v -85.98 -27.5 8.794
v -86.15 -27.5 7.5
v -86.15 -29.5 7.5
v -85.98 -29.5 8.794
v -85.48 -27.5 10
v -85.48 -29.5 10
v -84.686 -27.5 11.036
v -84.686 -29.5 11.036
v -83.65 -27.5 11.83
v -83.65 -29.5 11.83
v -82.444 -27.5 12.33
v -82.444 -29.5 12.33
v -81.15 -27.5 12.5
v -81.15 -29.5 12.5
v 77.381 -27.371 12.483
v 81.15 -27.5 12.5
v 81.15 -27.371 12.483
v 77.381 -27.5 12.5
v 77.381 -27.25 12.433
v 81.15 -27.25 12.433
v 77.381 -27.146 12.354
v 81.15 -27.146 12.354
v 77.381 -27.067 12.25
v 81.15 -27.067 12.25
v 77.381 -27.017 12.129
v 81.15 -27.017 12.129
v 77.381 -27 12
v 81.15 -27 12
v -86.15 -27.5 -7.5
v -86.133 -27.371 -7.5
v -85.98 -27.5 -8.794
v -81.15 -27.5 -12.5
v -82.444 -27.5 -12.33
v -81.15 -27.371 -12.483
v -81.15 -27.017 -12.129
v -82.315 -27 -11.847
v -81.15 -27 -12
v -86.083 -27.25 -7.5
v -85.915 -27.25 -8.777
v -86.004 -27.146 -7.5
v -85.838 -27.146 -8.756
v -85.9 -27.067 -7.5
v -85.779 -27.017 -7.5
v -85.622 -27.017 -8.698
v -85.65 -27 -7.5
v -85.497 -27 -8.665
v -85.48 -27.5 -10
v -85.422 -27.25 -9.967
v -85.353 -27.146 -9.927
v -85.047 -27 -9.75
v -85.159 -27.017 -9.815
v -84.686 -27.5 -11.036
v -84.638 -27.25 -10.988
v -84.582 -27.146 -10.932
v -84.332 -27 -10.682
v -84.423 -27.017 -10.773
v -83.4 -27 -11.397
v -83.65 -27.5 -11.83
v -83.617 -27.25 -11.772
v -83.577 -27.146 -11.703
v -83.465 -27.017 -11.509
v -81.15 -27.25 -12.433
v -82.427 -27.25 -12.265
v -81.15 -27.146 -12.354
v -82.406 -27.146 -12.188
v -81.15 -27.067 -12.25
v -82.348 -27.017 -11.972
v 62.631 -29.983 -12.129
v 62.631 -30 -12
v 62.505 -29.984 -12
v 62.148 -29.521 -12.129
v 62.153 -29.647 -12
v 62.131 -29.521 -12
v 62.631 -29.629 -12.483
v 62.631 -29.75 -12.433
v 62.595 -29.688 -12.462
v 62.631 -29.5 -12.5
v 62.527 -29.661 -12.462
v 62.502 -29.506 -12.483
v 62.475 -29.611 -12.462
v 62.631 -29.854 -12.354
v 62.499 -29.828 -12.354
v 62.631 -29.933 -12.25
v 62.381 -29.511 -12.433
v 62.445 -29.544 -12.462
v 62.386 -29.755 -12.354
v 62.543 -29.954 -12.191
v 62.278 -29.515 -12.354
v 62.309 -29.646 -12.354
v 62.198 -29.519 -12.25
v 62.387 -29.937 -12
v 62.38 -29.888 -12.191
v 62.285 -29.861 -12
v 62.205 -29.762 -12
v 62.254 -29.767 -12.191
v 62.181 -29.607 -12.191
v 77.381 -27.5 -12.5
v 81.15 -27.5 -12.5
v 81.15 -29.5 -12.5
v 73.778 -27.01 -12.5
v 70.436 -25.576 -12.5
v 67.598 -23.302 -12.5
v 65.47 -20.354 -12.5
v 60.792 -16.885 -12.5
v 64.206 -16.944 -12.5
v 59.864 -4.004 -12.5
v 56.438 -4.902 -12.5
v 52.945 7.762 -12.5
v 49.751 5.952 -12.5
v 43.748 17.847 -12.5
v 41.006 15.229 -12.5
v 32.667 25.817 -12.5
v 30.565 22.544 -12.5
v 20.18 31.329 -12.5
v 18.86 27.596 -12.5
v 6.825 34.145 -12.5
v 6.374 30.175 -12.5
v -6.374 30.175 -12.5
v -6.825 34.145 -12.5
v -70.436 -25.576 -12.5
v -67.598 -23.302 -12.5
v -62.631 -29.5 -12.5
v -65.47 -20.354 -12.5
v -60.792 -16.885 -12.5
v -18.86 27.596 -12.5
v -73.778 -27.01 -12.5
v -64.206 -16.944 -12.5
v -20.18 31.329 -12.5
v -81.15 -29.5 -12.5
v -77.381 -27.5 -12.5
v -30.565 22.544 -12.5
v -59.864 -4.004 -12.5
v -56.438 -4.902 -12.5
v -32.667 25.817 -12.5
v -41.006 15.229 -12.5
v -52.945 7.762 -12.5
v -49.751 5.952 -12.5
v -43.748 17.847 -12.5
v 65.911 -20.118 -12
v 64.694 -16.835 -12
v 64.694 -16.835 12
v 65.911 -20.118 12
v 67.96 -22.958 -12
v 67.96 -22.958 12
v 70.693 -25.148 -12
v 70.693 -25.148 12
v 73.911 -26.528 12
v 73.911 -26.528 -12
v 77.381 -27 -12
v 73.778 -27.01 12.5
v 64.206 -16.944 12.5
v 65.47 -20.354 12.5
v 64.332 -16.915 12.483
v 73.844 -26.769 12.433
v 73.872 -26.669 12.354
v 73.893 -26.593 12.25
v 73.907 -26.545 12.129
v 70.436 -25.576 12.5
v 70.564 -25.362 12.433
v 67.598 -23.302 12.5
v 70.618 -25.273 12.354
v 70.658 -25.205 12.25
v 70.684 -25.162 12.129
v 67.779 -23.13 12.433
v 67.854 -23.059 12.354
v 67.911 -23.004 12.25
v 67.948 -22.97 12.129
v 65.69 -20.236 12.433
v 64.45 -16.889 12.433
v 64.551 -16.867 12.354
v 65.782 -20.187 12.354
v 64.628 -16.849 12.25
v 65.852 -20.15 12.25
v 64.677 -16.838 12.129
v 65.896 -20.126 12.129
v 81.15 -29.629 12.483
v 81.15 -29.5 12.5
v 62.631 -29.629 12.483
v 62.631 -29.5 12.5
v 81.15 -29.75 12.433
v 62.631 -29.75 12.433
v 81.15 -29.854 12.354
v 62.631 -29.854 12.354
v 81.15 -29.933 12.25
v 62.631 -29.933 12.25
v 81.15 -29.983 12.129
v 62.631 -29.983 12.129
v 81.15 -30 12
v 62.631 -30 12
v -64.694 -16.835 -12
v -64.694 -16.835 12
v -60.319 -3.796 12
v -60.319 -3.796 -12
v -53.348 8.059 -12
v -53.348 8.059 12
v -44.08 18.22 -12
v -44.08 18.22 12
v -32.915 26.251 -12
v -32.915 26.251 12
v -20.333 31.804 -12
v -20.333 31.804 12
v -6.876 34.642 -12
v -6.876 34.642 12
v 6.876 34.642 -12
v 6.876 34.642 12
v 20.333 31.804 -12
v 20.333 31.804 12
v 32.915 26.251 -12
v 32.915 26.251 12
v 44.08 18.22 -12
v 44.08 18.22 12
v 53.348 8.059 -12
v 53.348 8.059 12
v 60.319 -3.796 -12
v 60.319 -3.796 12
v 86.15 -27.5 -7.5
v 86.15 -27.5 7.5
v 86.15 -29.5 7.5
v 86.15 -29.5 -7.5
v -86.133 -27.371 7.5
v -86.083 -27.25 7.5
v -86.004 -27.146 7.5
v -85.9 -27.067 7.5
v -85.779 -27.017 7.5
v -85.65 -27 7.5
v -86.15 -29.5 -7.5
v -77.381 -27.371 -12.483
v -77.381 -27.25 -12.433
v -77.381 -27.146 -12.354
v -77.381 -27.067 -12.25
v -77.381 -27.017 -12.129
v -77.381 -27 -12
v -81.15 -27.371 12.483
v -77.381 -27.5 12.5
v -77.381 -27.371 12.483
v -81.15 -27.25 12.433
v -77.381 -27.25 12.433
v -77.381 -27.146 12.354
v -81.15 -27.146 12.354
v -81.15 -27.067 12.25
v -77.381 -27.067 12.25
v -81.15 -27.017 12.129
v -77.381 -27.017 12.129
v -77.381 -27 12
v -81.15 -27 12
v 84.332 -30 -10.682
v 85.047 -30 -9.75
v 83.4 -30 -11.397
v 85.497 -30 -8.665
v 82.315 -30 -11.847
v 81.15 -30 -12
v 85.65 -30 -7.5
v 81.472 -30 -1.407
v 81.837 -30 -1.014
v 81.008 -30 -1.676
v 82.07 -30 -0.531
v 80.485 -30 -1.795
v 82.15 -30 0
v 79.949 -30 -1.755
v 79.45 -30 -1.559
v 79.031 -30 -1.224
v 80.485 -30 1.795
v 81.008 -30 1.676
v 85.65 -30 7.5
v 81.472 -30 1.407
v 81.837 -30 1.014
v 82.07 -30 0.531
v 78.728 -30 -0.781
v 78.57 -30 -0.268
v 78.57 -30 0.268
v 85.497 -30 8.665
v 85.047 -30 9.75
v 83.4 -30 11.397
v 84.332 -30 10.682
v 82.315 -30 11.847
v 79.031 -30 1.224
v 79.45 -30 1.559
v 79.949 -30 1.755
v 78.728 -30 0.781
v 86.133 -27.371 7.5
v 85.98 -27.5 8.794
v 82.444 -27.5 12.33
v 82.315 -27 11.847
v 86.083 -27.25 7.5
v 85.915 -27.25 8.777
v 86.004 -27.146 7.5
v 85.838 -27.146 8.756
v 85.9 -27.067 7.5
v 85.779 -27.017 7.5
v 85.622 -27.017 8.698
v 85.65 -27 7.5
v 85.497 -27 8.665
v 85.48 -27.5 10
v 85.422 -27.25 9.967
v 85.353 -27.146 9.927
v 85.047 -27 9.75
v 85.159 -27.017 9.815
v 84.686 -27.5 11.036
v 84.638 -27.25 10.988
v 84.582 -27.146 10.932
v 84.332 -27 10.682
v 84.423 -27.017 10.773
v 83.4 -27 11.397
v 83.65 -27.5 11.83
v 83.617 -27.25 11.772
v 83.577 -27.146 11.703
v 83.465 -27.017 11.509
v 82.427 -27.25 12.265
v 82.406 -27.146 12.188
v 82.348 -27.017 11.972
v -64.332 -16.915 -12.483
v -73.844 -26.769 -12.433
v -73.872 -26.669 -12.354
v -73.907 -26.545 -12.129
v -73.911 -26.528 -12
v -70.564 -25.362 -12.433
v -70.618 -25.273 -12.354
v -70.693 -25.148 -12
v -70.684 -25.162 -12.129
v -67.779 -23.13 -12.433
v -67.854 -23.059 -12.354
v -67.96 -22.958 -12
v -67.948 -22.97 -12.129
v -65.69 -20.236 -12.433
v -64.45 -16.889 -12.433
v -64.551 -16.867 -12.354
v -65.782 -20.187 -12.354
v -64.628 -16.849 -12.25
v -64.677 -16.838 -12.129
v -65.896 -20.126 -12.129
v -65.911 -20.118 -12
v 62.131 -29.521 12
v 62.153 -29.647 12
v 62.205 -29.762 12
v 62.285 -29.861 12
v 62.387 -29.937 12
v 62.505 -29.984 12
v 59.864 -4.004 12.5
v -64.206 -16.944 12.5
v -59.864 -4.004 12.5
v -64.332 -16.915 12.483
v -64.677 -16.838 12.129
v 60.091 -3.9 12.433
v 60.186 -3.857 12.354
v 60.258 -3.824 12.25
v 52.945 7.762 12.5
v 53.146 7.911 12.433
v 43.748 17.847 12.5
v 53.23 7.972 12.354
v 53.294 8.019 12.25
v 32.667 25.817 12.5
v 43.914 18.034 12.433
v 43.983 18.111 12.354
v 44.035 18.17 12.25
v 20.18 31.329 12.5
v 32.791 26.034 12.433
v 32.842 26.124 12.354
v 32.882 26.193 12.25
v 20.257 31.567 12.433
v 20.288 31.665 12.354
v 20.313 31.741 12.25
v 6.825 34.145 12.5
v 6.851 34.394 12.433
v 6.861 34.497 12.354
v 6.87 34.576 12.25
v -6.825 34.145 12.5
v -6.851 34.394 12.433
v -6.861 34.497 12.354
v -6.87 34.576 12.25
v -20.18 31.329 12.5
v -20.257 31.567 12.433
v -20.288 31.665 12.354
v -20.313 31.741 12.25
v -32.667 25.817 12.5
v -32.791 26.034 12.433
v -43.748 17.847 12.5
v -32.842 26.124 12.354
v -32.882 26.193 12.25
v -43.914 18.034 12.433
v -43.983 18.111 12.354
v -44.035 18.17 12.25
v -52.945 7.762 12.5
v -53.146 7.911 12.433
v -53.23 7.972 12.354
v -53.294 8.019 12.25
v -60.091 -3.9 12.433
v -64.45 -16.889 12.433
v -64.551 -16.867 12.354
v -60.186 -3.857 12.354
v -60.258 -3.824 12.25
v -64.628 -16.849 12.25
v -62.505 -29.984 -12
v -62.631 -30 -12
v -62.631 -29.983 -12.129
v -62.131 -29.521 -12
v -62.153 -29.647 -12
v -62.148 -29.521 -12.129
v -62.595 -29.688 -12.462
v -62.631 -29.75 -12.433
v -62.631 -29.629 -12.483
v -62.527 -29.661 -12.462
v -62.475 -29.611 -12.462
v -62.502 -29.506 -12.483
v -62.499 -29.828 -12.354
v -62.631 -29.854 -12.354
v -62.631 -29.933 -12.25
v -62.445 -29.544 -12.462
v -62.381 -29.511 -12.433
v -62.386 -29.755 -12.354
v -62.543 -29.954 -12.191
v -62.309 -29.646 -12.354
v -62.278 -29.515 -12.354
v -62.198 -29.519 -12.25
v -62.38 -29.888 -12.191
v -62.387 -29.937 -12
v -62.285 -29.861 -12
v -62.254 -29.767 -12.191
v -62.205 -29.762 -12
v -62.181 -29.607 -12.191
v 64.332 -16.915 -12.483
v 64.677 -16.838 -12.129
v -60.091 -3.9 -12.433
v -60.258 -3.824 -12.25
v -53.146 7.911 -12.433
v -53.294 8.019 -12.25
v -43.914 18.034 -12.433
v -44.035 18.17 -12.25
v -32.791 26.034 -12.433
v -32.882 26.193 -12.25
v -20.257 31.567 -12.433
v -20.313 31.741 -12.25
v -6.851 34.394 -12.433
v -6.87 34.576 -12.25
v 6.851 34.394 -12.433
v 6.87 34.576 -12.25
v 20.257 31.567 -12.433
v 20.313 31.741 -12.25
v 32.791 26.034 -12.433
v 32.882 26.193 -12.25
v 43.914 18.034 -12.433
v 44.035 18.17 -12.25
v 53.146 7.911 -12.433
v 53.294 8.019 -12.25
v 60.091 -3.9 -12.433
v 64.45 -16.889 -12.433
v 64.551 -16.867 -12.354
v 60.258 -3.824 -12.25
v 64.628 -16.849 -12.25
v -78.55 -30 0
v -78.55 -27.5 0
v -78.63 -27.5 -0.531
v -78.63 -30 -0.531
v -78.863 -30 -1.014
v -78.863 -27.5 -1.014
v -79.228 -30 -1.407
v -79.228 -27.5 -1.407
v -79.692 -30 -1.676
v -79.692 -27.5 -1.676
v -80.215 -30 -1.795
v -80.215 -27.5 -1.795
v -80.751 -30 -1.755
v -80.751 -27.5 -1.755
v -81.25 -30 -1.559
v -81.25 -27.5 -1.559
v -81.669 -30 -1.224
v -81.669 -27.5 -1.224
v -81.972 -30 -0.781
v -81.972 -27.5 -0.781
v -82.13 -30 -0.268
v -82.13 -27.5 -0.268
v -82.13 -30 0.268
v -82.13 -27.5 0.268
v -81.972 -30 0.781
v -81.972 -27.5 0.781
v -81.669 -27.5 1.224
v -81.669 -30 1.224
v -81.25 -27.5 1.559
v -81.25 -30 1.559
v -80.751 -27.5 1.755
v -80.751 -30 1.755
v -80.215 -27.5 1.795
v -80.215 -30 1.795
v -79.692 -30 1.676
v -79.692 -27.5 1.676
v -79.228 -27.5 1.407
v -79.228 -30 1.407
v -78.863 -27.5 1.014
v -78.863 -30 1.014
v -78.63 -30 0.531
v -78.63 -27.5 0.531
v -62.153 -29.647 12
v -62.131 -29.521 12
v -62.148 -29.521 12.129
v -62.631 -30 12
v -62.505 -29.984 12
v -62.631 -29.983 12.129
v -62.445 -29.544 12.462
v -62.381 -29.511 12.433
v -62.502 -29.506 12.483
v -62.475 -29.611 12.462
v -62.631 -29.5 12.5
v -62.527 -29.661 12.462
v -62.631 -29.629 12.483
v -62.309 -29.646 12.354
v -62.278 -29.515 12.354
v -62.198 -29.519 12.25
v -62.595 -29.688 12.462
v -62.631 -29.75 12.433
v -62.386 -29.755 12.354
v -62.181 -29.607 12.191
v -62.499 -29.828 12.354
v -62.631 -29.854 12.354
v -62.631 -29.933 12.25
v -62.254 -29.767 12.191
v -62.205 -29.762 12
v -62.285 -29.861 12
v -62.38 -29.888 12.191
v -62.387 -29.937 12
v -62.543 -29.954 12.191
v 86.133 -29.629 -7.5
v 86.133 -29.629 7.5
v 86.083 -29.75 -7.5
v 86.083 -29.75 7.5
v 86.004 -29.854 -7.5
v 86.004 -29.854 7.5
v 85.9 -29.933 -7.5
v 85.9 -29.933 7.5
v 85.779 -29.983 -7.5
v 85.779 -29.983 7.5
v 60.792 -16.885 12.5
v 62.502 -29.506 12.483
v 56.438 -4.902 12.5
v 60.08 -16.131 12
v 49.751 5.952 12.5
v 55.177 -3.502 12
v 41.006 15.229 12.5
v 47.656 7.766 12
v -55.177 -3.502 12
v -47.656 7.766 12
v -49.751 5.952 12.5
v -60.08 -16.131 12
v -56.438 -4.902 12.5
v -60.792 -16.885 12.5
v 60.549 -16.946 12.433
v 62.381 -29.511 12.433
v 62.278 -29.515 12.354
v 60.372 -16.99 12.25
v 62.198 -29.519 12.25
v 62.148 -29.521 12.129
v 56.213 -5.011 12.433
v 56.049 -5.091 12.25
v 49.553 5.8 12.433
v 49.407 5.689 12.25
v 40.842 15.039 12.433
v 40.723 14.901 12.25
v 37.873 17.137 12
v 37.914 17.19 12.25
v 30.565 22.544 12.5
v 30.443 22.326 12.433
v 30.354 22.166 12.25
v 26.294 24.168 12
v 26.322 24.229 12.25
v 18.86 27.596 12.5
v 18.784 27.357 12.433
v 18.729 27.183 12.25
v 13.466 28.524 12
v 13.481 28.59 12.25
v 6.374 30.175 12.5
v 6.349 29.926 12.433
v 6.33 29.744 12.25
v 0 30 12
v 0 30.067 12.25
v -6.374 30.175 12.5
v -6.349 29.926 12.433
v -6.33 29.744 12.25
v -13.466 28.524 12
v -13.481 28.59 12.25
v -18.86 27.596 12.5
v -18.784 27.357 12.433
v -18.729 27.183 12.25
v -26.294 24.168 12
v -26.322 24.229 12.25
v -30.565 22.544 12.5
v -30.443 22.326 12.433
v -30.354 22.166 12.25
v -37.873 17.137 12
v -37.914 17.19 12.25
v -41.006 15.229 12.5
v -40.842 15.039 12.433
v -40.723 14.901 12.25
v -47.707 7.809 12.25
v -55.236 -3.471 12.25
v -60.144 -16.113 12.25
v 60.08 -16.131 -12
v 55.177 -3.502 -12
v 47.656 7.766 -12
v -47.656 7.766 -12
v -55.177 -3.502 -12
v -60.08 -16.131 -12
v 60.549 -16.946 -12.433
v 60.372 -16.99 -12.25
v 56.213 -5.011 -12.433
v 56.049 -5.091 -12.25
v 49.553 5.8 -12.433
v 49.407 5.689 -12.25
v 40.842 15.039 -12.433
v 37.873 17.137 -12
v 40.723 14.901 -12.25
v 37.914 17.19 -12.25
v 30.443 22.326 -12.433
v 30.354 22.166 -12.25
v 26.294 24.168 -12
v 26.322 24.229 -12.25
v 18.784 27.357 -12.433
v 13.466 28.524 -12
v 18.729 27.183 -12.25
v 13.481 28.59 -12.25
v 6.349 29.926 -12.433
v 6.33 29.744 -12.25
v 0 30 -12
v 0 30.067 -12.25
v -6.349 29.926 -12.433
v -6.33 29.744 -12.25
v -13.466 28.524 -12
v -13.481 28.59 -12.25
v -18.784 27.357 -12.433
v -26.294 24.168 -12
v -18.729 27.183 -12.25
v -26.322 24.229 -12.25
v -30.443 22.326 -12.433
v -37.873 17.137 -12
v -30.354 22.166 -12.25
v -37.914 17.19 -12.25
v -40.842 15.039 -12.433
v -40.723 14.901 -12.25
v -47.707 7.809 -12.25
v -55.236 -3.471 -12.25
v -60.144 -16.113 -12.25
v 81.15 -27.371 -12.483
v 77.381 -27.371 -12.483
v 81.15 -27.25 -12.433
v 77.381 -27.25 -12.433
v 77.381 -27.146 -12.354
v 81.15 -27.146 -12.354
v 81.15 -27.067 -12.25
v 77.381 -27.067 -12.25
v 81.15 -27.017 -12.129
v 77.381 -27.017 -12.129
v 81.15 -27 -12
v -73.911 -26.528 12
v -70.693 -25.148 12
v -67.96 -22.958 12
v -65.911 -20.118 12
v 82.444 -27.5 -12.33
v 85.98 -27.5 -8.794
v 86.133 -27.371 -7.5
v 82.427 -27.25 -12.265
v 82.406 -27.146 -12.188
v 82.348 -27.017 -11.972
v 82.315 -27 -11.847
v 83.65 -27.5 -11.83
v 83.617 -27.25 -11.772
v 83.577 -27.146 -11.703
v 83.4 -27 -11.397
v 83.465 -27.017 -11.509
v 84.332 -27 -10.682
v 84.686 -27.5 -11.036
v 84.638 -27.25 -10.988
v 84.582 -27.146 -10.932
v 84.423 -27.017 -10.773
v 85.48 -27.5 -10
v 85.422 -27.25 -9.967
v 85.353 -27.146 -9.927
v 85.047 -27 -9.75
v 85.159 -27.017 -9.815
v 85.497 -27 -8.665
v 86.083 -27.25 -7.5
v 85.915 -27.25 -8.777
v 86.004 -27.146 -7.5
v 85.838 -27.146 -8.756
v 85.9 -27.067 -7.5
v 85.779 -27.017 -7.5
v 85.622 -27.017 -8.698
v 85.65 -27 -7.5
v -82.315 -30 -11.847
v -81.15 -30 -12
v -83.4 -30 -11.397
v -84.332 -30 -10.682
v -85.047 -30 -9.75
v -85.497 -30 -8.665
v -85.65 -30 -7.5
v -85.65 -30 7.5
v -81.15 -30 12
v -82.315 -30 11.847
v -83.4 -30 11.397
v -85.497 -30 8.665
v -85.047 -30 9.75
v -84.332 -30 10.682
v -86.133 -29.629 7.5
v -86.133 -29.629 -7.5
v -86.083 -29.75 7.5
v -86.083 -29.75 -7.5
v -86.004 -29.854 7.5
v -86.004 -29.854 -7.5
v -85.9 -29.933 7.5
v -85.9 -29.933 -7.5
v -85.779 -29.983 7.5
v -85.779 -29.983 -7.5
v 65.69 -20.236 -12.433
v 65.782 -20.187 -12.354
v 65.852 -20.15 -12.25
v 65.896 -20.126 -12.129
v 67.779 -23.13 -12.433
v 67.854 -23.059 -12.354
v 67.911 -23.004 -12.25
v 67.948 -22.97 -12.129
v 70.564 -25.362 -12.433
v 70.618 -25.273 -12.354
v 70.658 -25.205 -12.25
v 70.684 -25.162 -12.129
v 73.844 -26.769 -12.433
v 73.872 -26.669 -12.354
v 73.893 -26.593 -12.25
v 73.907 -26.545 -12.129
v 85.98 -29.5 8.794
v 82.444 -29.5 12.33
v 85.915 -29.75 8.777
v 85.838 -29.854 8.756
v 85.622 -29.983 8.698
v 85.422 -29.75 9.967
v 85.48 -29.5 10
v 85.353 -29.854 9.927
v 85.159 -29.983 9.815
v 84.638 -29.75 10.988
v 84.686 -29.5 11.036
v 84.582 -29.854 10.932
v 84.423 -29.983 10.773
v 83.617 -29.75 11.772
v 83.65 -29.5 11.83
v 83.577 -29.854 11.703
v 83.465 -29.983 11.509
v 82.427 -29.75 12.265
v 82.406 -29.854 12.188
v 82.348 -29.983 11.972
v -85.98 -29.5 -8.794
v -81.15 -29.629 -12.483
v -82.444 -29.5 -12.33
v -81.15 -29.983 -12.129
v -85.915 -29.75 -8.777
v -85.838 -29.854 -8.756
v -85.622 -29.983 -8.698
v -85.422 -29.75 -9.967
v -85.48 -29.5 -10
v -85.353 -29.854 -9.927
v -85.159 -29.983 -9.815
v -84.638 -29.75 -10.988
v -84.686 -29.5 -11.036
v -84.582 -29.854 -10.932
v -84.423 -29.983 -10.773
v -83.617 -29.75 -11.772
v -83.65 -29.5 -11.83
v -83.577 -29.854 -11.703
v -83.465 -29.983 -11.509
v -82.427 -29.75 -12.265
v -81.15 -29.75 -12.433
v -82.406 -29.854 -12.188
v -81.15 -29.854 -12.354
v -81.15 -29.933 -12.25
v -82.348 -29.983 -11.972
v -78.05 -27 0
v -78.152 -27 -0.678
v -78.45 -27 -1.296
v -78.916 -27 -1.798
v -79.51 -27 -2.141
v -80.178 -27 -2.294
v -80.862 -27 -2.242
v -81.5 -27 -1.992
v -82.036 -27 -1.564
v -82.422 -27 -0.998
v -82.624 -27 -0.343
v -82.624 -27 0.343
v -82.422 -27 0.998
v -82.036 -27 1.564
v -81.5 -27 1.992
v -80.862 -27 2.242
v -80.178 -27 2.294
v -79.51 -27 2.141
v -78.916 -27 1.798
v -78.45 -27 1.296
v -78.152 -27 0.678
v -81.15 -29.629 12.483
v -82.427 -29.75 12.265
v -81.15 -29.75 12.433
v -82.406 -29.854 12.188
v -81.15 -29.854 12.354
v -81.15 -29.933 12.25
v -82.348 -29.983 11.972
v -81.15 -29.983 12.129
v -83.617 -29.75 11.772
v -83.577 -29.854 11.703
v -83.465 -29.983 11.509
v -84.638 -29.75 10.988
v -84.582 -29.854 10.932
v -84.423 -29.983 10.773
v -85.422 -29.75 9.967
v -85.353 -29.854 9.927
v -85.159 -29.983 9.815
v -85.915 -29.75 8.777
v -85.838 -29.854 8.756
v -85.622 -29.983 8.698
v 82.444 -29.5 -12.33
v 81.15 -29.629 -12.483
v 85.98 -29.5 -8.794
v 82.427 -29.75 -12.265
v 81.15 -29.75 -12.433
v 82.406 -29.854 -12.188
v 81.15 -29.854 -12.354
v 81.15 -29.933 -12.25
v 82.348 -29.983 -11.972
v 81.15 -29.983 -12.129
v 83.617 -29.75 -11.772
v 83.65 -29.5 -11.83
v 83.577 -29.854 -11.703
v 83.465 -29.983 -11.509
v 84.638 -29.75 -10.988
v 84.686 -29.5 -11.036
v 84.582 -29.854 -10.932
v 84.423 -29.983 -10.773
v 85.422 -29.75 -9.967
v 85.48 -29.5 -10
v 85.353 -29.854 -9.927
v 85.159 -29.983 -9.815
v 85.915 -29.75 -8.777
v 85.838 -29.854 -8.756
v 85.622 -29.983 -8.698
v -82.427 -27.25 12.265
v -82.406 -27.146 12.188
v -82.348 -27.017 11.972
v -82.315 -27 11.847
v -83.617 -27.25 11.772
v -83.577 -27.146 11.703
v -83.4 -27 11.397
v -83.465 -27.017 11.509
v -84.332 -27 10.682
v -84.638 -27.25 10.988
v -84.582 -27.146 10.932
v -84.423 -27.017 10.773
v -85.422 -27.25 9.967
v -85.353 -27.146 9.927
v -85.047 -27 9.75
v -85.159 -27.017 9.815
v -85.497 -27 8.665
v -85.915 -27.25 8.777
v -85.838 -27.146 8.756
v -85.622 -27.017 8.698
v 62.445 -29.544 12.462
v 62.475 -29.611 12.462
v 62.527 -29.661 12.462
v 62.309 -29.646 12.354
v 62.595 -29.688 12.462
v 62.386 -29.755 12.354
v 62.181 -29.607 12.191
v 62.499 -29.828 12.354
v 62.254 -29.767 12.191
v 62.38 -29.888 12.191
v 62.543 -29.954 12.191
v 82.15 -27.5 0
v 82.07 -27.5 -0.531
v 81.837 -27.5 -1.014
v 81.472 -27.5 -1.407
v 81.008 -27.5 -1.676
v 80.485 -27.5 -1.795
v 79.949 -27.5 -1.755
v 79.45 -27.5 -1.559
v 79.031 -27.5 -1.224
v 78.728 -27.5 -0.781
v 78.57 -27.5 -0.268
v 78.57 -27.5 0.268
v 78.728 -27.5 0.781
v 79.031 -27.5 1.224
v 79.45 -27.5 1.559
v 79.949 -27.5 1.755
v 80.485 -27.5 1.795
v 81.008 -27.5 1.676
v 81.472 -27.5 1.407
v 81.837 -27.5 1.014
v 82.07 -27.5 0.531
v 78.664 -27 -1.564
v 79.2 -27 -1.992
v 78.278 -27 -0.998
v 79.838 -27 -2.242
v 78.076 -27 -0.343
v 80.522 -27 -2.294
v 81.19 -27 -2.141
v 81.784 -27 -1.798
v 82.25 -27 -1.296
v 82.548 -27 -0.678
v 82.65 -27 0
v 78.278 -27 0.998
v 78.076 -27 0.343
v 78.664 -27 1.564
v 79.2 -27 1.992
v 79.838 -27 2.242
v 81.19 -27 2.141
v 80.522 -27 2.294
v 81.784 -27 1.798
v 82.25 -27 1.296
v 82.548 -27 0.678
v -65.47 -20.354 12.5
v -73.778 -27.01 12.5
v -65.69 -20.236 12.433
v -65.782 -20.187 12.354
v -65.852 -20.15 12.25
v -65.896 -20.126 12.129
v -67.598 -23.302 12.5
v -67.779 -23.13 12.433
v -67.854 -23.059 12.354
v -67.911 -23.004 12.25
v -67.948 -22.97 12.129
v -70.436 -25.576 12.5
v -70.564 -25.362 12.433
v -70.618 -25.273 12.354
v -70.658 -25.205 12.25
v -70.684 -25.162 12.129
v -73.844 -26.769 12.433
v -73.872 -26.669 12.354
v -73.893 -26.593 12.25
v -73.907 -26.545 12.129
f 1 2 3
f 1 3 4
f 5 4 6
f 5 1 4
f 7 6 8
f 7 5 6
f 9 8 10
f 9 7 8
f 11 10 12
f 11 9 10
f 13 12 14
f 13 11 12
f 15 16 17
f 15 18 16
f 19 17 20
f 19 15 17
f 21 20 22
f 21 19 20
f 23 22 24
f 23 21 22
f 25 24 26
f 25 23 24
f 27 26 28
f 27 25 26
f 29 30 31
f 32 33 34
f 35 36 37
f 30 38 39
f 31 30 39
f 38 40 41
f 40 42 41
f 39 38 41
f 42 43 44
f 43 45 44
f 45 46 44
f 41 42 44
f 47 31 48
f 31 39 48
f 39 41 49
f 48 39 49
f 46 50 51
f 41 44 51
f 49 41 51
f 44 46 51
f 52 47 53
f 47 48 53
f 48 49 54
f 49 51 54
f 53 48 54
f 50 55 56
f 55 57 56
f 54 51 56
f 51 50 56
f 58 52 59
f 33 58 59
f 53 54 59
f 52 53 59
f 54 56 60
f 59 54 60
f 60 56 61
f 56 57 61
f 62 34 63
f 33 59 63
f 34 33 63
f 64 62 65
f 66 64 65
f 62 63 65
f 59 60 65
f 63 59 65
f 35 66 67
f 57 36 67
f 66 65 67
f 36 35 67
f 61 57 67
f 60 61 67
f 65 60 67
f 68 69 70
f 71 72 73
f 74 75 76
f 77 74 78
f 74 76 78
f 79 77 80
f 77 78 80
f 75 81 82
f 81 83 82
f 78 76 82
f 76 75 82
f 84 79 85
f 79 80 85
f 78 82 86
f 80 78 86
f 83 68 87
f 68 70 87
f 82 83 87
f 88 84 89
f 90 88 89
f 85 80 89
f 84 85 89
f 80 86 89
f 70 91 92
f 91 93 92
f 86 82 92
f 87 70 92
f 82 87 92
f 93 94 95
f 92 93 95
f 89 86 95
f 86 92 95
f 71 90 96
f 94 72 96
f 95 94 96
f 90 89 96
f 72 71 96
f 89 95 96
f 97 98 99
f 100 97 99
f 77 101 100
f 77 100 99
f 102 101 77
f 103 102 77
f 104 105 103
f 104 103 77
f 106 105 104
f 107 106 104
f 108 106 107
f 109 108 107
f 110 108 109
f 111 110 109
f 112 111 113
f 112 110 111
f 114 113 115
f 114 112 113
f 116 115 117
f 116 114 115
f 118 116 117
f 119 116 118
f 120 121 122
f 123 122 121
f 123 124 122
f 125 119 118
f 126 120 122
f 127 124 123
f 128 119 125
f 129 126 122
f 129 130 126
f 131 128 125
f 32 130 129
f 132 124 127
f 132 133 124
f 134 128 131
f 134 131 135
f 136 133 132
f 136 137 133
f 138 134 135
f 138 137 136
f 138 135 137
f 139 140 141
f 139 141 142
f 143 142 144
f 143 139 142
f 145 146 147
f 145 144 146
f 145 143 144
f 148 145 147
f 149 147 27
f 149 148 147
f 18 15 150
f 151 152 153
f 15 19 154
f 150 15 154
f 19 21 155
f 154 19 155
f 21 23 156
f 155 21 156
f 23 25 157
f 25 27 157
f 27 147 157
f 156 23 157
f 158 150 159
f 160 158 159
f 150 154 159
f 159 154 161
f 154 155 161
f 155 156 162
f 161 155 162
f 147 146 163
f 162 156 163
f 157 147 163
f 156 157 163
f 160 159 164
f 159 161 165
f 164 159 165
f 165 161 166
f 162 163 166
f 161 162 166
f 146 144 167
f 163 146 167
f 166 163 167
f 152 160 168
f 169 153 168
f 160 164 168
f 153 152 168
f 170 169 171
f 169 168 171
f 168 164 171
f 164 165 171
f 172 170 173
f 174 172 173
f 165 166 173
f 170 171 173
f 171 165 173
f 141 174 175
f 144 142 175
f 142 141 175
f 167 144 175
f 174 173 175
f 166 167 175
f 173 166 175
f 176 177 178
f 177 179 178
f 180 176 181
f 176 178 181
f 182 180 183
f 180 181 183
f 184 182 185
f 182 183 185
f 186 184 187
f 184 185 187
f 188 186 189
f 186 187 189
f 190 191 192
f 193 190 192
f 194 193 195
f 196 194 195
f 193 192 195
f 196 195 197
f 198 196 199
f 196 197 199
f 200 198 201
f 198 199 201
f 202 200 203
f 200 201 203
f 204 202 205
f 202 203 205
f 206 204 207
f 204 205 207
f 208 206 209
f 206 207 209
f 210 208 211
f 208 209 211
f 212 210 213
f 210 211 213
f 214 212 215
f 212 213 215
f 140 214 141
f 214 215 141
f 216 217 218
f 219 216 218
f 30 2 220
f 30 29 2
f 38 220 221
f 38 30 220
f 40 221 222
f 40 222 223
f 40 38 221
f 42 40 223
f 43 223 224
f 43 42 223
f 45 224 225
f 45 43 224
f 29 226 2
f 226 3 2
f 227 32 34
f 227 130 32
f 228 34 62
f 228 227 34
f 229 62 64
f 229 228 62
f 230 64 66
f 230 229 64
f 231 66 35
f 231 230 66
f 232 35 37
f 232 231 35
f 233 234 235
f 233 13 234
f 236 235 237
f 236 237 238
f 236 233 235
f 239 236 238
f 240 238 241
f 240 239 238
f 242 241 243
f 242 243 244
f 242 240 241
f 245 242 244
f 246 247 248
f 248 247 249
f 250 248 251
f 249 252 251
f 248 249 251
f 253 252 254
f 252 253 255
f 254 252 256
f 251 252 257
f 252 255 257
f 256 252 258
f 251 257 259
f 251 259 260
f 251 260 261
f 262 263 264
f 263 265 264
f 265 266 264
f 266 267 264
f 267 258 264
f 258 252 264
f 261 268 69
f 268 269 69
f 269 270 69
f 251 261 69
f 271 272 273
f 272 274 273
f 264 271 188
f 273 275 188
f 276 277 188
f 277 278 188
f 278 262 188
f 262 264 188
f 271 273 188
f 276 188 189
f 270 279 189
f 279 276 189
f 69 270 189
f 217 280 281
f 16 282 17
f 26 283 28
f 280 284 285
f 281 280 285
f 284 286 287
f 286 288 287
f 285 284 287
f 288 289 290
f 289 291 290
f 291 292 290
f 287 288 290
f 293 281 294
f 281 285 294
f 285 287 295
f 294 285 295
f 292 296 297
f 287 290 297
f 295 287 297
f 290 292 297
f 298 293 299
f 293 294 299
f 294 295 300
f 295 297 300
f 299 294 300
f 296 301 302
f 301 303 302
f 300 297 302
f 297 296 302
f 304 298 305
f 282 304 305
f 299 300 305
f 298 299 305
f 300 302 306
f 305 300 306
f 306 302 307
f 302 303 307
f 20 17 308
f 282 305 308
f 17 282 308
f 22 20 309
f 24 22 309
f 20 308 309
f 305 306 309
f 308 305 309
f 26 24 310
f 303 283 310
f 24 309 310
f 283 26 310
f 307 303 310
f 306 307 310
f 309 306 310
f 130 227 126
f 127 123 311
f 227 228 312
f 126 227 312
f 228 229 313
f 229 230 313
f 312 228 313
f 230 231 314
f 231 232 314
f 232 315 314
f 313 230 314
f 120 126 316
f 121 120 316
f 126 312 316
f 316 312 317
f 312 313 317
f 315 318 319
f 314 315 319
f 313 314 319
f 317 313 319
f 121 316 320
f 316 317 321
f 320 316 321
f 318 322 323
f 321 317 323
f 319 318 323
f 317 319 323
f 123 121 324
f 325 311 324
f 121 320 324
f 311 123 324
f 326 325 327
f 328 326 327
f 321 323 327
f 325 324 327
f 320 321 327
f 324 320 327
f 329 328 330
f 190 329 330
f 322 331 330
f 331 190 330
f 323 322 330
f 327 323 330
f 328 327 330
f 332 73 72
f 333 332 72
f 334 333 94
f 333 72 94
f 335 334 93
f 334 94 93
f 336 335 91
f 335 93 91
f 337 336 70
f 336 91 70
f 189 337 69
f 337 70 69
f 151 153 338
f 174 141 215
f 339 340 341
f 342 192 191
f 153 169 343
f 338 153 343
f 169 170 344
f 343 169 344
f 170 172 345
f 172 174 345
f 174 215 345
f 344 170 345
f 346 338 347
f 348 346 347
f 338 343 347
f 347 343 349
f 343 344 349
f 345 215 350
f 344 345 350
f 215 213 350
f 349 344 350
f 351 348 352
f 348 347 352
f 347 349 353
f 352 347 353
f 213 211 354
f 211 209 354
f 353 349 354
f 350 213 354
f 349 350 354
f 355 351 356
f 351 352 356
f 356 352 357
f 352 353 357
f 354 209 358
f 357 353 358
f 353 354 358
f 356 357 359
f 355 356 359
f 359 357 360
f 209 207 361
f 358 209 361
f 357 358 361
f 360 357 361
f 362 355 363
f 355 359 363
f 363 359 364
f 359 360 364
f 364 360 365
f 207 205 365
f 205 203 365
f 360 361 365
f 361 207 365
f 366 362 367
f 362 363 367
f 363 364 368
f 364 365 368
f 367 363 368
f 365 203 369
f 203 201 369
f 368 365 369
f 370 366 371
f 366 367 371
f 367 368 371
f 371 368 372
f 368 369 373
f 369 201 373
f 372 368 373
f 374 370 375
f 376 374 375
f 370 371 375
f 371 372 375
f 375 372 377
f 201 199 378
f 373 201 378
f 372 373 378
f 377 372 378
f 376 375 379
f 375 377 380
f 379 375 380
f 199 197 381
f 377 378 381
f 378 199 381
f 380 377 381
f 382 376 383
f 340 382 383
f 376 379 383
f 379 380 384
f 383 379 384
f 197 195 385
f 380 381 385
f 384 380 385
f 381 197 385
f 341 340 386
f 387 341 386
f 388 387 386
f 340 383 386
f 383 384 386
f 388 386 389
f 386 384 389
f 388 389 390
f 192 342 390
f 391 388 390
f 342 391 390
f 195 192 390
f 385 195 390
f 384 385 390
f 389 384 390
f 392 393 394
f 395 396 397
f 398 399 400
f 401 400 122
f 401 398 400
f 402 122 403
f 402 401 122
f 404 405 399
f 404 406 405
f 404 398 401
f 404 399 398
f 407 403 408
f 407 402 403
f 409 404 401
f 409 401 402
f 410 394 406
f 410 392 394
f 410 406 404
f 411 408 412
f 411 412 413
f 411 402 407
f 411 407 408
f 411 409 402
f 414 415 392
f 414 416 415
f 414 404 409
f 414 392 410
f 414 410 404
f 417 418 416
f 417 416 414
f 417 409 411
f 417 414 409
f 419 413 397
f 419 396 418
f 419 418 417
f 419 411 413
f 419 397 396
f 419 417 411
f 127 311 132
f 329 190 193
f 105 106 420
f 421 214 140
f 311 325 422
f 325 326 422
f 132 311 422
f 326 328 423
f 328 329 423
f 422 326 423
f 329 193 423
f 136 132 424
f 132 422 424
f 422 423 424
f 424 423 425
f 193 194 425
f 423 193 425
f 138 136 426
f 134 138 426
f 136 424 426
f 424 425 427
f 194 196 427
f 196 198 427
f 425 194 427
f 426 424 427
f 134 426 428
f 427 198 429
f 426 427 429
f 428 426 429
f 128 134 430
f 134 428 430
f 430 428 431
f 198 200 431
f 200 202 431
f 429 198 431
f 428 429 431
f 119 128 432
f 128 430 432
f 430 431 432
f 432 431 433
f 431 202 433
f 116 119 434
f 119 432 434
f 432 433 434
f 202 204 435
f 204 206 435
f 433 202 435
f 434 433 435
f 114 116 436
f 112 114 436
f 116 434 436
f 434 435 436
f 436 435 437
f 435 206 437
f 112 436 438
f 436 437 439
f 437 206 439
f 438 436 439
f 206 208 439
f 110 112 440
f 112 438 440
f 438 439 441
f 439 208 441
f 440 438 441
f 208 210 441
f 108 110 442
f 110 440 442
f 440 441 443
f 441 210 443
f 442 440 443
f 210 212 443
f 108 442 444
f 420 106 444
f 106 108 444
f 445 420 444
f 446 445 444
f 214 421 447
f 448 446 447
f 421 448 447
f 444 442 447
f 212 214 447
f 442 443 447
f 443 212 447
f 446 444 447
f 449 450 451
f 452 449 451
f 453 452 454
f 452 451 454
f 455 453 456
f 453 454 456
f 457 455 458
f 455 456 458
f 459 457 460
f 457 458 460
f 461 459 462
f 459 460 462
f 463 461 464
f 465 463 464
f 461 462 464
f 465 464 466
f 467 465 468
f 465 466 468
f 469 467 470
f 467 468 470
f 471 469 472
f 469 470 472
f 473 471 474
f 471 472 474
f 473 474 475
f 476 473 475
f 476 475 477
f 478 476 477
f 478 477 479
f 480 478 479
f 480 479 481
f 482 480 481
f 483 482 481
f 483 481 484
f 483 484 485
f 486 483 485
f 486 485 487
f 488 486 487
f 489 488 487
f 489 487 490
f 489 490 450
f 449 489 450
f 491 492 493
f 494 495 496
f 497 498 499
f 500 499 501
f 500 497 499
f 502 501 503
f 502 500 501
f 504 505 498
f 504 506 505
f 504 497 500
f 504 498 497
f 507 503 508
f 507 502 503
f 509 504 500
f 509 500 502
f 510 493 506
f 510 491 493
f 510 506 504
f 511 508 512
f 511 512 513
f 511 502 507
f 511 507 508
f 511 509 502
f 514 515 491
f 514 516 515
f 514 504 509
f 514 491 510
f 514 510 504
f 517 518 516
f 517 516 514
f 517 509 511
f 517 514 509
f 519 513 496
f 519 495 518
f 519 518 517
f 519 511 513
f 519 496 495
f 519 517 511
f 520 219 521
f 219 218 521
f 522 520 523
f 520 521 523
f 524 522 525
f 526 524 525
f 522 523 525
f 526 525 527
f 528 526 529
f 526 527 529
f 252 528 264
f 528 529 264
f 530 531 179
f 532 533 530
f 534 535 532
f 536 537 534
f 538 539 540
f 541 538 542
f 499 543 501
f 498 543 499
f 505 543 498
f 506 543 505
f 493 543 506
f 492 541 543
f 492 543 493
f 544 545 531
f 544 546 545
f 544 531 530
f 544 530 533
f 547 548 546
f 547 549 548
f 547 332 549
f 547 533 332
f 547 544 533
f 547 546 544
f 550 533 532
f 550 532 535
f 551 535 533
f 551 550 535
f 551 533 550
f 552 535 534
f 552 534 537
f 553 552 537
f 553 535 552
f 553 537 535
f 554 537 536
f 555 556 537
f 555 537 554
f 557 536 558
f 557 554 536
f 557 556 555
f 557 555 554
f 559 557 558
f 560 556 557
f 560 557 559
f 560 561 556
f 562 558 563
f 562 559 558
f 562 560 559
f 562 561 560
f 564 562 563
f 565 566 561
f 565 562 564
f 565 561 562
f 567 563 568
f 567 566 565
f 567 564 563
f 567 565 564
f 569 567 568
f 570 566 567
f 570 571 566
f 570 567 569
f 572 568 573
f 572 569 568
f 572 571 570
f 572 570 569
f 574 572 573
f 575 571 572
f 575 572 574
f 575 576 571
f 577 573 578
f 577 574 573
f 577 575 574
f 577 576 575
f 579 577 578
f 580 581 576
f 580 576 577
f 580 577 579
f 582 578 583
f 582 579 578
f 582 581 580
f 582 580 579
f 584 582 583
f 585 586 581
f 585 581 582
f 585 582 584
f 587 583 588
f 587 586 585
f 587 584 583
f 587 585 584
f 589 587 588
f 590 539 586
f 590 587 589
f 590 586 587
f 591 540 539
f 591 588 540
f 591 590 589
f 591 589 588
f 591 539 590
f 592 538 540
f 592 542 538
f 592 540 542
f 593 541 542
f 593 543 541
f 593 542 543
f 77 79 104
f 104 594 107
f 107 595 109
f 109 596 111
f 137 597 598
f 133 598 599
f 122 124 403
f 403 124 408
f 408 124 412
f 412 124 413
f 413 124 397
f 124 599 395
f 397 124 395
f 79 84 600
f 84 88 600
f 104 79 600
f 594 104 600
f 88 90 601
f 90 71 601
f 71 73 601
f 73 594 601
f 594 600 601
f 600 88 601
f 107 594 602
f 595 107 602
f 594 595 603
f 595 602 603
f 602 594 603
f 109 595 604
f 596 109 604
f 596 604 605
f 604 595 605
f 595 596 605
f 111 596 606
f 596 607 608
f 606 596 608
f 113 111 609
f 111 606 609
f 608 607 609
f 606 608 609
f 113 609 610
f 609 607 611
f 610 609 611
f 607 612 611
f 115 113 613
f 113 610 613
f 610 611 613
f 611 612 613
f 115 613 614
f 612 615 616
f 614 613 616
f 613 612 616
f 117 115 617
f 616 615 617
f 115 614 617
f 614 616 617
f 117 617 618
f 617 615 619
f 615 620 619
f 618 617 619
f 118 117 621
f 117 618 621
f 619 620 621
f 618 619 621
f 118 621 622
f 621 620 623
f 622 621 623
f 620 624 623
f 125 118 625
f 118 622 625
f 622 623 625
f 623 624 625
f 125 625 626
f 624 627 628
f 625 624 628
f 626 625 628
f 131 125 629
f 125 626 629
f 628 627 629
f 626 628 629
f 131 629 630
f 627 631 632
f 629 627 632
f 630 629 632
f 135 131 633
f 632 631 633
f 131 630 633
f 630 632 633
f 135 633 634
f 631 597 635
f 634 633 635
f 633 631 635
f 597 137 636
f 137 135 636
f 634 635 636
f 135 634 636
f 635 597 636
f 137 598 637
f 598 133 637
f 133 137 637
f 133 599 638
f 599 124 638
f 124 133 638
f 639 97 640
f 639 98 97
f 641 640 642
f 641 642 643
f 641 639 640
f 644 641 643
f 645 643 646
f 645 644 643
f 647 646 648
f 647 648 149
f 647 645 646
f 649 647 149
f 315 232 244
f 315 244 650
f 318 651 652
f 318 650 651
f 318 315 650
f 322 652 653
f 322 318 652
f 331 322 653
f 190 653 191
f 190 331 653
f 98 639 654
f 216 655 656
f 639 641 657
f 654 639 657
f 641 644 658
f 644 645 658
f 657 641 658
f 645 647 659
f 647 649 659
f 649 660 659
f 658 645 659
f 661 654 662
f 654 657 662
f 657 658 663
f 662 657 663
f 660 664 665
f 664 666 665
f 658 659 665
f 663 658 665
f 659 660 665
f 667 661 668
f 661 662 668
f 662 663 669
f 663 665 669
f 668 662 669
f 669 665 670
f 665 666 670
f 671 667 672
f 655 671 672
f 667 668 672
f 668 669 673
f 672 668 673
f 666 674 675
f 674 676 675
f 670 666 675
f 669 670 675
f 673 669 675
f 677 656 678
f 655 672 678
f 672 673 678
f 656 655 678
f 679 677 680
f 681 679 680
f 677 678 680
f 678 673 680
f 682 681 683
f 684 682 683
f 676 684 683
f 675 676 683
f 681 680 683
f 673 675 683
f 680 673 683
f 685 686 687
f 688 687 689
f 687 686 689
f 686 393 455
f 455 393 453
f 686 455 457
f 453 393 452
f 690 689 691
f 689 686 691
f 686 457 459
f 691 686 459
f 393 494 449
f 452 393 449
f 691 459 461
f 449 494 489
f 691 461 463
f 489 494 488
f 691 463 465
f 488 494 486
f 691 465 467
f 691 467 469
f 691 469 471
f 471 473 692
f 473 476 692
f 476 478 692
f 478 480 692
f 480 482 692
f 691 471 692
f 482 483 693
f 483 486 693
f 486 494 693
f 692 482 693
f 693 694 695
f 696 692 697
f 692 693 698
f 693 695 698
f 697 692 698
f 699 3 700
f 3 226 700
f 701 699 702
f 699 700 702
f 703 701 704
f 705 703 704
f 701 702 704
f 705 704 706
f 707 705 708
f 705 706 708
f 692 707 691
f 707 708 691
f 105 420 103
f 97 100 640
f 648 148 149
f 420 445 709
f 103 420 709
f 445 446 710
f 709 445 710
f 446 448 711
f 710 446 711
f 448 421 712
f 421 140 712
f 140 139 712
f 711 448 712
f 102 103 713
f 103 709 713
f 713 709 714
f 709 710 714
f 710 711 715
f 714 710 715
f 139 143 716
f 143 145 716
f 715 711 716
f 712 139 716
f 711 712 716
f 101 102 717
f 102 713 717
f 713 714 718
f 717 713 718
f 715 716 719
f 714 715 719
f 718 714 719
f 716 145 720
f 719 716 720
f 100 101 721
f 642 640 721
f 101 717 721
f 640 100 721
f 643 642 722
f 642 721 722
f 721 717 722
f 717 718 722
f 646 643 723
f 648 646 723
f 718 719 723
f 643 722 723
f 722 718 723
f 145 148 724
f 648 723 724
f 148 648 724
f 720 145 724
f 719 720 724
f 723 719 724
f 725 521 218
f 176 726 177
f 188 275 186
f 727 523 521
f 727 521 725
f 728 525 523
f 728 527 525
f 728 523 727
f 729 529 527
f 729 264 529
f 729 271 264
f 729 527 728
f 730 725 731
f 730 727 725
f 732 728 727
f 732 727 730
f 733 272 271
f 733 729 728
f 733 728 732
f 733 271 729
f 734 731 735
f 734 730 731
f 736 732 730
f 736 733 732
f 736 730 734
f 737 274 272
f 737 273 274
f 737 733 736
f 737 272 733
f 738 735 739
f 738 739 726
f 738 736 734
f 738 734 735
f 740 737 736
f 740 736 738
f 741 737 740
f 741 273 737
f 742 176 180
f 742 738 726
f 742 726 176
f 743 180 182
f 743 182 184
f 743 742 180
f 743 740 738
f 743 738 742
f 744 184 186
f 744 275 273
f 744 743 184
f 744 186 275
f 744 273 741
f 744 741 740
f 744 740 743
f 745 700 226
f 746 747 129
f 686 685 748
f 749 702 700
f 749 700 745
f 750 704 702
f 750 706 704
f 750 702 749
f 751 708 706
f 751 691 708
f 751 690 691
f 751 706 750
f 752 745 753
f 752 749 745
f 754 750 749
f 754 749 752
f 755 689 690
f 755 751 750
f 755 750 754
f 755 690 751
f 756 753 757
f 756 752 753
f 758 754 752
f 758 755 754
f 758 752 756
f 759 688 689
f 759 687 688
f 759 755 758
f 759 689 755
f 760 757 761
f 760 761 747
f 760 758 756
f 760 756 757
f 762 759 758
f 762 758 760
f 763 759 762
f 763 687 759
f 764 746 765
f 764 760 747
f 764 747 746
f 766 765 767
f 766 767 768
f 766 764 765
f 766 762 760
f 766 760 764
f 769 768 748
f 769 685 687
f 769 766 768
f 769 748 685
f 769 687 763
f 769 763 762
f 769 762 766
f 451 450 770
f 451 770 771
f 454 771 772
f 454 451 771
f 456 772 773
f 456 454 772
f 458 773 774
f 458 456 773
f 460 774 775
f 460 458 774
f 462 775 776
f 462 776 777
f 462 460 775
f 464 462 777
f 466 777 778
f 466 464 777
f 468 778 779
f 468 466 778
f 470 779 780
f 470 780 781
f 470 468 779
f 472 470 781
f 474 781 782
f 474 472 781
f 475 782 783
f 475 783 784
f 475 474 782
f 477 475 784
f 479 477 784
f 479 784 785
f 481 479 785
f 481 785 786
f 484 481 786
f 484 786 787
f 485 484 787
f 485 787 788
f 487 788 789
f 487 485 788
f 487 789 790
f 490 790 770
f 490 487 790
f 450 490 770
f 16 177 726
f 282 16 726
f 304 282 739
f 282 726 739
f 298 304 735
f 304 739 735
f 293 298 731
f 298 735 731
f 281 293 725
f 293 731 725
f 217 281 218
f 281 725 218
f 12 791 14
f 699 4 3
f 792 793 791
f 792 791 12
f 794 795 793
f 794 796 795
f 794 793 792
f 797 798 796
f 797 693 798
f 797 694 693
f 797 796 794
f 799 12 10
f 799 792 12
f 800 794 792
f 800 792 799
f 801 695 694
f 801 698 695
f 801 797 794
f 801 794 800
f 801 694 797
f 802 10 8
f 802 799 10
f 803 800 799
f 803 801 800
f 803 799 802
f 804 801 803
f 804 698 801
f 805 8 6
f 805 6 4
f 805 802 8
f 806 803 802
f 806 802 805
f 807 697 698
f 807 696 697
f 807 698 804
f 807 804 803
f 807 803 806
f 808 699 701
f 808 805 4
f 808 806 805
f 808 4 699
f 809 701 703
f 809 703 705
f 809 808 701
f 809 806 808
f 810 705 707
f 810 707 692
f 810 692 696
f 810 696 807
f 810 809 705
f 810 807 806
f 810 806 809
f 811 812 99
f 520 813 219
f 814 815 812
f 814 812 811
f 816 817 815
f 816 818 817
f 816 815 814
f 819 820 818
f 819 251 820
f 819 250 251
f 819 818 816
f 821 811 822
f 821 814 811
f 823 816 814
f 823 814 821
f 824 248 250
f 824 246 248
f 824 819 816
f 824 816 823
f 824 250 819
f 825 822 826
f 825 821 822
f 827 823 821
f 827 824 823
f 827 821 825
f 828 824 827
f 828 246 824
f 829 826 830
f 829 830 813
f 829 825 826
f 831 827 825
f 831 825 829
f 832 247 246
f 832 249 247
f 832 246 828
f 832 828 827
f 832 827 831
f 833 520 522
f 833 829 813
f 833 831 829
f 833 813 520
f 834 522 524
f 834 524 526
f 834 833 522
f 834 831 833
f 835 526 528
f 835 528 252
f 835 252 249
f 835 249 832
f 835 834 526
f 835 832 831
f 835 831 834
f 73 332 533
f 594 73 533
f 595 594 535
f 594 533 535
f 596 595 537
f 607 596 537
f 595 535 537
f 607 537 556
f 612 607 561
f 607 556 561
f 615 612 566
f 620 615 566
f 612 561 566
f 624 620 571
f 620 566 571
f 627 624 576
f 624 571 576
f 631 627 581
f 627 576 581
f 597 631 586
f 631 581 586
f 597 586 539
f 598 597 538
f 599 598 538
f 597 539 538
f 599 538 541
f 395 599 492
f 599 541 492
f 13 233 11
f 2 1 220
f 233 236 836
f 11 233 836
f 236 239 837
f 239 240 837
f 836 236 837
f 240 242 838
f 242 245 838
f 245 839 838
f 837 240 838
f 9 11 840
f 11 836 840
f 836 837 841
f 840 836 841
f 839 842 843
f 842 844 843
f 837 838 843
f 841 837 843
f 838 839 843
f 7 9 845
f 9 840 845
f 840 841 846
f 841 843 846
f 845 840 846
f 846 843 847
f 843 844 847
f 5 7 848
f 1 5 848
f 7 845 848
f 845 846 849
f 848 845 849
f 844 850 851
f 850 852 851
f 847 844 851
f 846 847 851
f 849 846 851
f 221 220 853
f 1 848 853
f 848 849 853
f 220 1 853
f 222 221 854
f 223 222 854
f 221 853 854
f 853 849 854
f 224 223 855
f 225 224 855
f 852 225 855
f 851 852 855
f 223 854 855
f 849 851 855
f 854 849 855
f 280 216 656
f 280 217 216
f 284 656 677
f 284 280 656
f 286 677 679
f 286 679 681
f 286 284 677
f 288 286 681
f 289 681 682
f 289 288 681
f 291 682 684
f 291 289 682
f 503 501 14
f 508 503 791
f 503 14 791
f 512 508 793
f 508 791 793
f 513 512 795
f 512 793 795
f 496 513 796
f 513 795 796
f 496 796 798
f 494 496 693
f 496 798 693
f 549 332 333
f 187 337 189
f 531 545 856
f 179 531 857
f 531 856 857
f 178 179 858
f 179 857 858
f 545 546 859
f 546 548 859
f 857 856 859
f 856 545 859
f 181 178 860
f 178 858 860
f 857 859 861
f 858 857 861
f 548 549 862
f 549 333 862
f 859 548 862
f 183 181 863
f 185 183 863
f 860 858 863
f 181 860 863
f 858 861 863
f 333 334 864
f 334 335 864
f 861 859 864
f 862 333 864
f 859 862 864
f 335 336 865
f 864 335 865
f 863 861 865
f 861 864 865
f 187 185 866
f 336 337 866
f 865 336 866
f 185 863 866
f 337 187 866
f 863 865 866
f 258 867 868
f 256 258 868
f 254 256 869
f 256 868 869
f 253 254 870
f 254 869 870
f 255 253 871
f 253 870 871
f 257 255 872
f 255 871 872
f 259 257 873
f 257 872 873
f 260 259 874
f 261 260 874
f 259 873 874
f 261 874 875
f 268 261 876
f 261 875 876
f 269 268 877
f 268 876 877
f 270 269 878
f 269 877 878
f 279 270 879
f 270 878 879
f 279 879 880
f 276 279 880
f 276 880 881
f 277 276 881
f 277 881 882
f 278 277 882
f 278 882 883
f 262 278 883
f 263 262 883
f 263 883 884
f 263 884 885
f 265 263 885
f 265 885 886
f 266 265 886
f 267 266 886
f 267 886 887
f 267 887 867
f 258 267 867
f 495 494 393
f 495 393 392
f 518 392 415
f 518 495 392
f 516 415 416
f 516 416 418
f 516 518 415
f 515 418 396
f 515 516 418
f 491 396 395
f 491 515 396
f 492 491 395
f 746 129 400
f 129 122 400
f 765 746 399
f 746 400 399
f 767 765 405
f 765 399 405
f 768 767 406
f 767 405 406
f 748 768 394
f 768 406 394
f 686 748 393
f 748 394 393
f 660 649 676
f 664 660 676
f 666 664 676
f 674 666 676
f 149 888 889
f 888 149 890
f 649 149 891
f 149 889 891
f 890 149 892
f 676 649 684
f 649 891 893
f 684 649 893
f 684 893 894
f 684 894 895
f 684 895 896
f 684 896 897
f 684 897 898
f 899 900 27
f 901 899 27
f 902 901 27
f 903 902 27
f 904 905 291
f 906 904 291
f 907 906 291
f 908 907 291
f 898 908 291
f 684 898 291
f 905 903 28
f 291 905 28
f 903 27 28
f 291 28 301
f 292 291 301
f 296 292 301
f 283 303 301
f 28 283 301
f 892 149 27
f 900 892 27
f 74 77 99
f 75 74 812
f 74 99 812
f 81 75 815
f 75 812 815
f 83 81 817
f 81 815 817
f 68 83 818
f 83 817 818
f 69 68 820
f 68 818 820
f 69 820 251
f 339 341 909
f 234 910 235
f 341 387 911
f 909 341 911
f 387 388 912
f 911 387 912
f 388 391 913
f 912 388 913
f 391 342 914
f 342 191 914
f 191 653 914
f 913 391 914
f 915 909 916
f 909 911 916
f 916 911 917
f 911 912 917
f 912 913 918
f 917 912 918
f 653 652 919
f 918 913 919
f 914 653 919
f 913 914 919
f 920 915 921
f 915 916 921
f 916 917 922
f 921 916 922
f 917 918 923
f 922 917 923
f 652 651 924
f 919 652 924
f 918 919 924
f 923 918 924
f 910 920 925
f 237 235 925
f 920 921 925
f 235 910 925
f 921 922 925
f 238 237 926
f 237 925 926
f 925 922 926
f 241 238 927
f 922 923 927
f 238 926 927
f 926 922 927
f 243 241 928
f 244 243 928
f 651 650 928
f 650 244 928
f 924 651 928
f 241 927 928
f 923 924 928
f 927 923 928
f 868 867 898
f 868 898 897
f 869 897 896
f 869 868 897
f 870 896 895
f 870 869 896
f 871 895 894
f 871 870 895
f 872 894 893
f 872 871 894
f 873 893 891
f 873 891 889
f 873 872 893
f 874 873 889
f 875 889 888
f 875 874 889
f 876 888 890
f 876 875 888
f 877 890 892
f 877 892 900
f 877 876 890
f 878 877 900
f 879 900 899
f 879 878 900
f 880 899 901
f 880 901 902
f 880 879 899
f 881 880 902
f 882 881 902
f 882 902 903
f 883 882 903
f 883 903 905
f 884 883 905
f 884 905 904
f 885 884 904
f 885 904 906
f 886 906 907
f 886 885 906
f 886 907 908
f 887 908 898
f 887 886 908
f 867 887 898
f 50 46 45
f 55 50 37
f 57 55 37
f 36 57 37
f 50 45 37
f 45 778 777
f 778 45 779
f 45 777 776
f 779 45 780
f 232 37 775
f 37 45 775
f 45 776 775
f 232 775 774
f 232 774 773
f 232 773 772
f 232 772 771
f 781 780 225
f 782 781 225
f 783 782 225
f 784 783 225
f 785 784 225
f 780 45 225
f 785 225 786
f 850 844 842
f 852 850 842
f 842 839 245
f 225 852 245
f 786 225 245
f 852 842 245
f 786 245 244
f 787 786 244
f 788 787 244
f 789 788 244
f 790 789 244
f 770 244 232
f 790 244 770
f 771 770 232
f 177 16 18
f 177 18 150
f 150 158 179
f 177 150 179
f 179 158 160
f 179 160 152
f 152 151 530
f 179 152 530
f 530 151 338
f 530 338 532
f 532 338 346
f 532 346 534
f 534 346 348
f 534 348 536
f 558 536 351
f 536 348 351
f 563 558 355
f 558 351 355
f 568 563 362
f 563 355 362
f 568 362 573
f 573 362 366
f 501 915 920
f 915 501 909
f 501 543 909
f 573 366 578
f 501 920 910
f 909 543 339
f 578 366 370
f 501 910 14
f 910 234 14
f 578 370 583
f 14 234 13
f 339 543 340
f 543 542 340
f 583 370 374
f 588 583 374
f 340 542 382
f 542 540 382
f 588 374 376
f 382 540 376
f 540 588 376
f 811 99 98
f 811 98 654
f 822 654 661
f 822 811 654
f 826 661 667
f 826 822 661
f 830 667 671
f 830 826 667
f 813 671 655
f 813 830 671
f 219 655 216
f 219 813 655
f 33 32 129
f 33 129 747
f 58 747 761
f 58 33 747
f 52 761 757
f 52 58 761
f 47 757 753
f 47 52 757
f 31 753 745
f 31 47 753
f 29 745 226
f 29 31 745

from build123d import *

# Parameters (mm, degrees)
BOSS_EXTRUDE1_DEPTH     = 12.5
SKETCH2_R               = 1.8
CUT_EXTRUDE4_DEPTH      = 36
CUT_EXTRUDE4_DEPTH_BACK = 31
CHAMFER1_SIZE           = 0.5
FILLET1_R               = 13
FILLET2_R               = 5
FILLET3_R               = 0.5


with BuildPart() as part:
    # Sketch1 → Boss-Extrude1 (new body, symmetric)
    with BuildSketch(Plane.XY):
        with BuildLine():
            Line((-86.15, -27), (-66.15, -27))
            ThreePointArc((-66.15, -27), (0, 35), (66.15, -27))
            Line((66.15, -27), (86.15, -27))
            Line((86.15, -27), (86.15, -30))
            Line((86.15, -30), (62.15, -30))
            ThreePointArc((62.15, -30), (0, 30), (-62.15, -30))
            Line((-62.15, -30), (-86.15, -30))
            Line((-86.15, -30), (-86.15, -27))
        make_face()
    extrude(amount=BOSS_EXTRUDE1_DEPTH, both=True)

    # Sketch2 → Cut-Extrude4 (cut, two sides)
    with BuildSketch(Plane(origin=(0, 0, 0), x_dir=(1, 0, 0), z_dir=(0, 1, 0))) as cut_extrude4_sk:
        with Locations((-80.35, 0)):
            Circle(SKETCH2_R)
        with Locations((80.35, 0)):
            Circle(SKETCH2_R)
    extrude(amount=CUT_EXTRUDE4_DEPTH, mode=Mode.SUBTRACT)
    extrude(cut_extrude4_sk.sketch, amount=-CUT_EXTRUDE4_DEPTH_BACK, mode=Mode.SUBTRACT)

    # Chamfer1
    chamfer1_edges = [part.edges().sort_by_distance(p)[0] for p in [
        (-82.15, -27, 0),
        (78.55, -27, 0),
    ]]
    chamfer(chamfer1_edges, length=CHAMFER1_SIZE)

    # Fillet1
    fillet1_edges = [part.edges().sort_by_distance(p)[0] for p in [
        (66.15, -27, 0),
        (-66.15, -27, 0),
    ]]
    fillet(fillet1_edges, radius=FILLET1_R)

    # Fillet2
    fillet2_edges = [part.edges().sort_by_distance(p)[0] for p in [
        (-86.15, -28.5, -12.5),
        (-86.15, -28.5, 12.5),
        (86.15, -28.5, 12.5),
        (86.15, -28.5, -12.5),
    ]]
    fillet(fillet2_edges, radius=FILLET2_R)

    # Fillet3
    fillet3_edges = [part.edges().sort_by_distance(p)[0] for p in [
        (62.15, -30, 0),
        (-62.15, -30, 0),
        (0, 30, 12.5),
        (71.65, -30, 12.5),
        (0, 35, -12.5),
        (0, 35, 12.5),
        (-79.265510788, -27, -12.5),
        (-79.265510788, -27, 12.5),
        (69.252379009, -24.145204287, -12.5),
        (69.252379009, -24.145204287, 12.5),
        (-69.252379009, -24.145204287, -12.5),
        (-69.252379009, -24.145204287, 12.5),
        (79.265510788, -27, 12.5),
        (-71.65, -30, 12.5),
        (79.265510788, -27, -12.5),
        (86.15, -27, 0),
        (84.685533906, -27, -11.035533906),
        (84.685533906, -27, 11.035533906),
        (86.15, -30, 0),
        (84.685533906, -30, -11.035533906),
        (84.685533906, -30, 11.035533906),
        (-71.65, -30, -12.5),
        (-86.15, -30, 0),
        (-86.15, -27, 0),
        (-84.685533906, -30, 11.035533906),
        (-84.685533906, -30, -11.035533906),
        (-84.685533906, -27, 11.035533906),
        (-84.685533906, -27, -11.035533906),
        (71.65, -30, -12.5),
        (0, 30, -12.5),
    ]]
    fillet(fillet3_edges, radius=FILLET3_R)


solid = part.part
